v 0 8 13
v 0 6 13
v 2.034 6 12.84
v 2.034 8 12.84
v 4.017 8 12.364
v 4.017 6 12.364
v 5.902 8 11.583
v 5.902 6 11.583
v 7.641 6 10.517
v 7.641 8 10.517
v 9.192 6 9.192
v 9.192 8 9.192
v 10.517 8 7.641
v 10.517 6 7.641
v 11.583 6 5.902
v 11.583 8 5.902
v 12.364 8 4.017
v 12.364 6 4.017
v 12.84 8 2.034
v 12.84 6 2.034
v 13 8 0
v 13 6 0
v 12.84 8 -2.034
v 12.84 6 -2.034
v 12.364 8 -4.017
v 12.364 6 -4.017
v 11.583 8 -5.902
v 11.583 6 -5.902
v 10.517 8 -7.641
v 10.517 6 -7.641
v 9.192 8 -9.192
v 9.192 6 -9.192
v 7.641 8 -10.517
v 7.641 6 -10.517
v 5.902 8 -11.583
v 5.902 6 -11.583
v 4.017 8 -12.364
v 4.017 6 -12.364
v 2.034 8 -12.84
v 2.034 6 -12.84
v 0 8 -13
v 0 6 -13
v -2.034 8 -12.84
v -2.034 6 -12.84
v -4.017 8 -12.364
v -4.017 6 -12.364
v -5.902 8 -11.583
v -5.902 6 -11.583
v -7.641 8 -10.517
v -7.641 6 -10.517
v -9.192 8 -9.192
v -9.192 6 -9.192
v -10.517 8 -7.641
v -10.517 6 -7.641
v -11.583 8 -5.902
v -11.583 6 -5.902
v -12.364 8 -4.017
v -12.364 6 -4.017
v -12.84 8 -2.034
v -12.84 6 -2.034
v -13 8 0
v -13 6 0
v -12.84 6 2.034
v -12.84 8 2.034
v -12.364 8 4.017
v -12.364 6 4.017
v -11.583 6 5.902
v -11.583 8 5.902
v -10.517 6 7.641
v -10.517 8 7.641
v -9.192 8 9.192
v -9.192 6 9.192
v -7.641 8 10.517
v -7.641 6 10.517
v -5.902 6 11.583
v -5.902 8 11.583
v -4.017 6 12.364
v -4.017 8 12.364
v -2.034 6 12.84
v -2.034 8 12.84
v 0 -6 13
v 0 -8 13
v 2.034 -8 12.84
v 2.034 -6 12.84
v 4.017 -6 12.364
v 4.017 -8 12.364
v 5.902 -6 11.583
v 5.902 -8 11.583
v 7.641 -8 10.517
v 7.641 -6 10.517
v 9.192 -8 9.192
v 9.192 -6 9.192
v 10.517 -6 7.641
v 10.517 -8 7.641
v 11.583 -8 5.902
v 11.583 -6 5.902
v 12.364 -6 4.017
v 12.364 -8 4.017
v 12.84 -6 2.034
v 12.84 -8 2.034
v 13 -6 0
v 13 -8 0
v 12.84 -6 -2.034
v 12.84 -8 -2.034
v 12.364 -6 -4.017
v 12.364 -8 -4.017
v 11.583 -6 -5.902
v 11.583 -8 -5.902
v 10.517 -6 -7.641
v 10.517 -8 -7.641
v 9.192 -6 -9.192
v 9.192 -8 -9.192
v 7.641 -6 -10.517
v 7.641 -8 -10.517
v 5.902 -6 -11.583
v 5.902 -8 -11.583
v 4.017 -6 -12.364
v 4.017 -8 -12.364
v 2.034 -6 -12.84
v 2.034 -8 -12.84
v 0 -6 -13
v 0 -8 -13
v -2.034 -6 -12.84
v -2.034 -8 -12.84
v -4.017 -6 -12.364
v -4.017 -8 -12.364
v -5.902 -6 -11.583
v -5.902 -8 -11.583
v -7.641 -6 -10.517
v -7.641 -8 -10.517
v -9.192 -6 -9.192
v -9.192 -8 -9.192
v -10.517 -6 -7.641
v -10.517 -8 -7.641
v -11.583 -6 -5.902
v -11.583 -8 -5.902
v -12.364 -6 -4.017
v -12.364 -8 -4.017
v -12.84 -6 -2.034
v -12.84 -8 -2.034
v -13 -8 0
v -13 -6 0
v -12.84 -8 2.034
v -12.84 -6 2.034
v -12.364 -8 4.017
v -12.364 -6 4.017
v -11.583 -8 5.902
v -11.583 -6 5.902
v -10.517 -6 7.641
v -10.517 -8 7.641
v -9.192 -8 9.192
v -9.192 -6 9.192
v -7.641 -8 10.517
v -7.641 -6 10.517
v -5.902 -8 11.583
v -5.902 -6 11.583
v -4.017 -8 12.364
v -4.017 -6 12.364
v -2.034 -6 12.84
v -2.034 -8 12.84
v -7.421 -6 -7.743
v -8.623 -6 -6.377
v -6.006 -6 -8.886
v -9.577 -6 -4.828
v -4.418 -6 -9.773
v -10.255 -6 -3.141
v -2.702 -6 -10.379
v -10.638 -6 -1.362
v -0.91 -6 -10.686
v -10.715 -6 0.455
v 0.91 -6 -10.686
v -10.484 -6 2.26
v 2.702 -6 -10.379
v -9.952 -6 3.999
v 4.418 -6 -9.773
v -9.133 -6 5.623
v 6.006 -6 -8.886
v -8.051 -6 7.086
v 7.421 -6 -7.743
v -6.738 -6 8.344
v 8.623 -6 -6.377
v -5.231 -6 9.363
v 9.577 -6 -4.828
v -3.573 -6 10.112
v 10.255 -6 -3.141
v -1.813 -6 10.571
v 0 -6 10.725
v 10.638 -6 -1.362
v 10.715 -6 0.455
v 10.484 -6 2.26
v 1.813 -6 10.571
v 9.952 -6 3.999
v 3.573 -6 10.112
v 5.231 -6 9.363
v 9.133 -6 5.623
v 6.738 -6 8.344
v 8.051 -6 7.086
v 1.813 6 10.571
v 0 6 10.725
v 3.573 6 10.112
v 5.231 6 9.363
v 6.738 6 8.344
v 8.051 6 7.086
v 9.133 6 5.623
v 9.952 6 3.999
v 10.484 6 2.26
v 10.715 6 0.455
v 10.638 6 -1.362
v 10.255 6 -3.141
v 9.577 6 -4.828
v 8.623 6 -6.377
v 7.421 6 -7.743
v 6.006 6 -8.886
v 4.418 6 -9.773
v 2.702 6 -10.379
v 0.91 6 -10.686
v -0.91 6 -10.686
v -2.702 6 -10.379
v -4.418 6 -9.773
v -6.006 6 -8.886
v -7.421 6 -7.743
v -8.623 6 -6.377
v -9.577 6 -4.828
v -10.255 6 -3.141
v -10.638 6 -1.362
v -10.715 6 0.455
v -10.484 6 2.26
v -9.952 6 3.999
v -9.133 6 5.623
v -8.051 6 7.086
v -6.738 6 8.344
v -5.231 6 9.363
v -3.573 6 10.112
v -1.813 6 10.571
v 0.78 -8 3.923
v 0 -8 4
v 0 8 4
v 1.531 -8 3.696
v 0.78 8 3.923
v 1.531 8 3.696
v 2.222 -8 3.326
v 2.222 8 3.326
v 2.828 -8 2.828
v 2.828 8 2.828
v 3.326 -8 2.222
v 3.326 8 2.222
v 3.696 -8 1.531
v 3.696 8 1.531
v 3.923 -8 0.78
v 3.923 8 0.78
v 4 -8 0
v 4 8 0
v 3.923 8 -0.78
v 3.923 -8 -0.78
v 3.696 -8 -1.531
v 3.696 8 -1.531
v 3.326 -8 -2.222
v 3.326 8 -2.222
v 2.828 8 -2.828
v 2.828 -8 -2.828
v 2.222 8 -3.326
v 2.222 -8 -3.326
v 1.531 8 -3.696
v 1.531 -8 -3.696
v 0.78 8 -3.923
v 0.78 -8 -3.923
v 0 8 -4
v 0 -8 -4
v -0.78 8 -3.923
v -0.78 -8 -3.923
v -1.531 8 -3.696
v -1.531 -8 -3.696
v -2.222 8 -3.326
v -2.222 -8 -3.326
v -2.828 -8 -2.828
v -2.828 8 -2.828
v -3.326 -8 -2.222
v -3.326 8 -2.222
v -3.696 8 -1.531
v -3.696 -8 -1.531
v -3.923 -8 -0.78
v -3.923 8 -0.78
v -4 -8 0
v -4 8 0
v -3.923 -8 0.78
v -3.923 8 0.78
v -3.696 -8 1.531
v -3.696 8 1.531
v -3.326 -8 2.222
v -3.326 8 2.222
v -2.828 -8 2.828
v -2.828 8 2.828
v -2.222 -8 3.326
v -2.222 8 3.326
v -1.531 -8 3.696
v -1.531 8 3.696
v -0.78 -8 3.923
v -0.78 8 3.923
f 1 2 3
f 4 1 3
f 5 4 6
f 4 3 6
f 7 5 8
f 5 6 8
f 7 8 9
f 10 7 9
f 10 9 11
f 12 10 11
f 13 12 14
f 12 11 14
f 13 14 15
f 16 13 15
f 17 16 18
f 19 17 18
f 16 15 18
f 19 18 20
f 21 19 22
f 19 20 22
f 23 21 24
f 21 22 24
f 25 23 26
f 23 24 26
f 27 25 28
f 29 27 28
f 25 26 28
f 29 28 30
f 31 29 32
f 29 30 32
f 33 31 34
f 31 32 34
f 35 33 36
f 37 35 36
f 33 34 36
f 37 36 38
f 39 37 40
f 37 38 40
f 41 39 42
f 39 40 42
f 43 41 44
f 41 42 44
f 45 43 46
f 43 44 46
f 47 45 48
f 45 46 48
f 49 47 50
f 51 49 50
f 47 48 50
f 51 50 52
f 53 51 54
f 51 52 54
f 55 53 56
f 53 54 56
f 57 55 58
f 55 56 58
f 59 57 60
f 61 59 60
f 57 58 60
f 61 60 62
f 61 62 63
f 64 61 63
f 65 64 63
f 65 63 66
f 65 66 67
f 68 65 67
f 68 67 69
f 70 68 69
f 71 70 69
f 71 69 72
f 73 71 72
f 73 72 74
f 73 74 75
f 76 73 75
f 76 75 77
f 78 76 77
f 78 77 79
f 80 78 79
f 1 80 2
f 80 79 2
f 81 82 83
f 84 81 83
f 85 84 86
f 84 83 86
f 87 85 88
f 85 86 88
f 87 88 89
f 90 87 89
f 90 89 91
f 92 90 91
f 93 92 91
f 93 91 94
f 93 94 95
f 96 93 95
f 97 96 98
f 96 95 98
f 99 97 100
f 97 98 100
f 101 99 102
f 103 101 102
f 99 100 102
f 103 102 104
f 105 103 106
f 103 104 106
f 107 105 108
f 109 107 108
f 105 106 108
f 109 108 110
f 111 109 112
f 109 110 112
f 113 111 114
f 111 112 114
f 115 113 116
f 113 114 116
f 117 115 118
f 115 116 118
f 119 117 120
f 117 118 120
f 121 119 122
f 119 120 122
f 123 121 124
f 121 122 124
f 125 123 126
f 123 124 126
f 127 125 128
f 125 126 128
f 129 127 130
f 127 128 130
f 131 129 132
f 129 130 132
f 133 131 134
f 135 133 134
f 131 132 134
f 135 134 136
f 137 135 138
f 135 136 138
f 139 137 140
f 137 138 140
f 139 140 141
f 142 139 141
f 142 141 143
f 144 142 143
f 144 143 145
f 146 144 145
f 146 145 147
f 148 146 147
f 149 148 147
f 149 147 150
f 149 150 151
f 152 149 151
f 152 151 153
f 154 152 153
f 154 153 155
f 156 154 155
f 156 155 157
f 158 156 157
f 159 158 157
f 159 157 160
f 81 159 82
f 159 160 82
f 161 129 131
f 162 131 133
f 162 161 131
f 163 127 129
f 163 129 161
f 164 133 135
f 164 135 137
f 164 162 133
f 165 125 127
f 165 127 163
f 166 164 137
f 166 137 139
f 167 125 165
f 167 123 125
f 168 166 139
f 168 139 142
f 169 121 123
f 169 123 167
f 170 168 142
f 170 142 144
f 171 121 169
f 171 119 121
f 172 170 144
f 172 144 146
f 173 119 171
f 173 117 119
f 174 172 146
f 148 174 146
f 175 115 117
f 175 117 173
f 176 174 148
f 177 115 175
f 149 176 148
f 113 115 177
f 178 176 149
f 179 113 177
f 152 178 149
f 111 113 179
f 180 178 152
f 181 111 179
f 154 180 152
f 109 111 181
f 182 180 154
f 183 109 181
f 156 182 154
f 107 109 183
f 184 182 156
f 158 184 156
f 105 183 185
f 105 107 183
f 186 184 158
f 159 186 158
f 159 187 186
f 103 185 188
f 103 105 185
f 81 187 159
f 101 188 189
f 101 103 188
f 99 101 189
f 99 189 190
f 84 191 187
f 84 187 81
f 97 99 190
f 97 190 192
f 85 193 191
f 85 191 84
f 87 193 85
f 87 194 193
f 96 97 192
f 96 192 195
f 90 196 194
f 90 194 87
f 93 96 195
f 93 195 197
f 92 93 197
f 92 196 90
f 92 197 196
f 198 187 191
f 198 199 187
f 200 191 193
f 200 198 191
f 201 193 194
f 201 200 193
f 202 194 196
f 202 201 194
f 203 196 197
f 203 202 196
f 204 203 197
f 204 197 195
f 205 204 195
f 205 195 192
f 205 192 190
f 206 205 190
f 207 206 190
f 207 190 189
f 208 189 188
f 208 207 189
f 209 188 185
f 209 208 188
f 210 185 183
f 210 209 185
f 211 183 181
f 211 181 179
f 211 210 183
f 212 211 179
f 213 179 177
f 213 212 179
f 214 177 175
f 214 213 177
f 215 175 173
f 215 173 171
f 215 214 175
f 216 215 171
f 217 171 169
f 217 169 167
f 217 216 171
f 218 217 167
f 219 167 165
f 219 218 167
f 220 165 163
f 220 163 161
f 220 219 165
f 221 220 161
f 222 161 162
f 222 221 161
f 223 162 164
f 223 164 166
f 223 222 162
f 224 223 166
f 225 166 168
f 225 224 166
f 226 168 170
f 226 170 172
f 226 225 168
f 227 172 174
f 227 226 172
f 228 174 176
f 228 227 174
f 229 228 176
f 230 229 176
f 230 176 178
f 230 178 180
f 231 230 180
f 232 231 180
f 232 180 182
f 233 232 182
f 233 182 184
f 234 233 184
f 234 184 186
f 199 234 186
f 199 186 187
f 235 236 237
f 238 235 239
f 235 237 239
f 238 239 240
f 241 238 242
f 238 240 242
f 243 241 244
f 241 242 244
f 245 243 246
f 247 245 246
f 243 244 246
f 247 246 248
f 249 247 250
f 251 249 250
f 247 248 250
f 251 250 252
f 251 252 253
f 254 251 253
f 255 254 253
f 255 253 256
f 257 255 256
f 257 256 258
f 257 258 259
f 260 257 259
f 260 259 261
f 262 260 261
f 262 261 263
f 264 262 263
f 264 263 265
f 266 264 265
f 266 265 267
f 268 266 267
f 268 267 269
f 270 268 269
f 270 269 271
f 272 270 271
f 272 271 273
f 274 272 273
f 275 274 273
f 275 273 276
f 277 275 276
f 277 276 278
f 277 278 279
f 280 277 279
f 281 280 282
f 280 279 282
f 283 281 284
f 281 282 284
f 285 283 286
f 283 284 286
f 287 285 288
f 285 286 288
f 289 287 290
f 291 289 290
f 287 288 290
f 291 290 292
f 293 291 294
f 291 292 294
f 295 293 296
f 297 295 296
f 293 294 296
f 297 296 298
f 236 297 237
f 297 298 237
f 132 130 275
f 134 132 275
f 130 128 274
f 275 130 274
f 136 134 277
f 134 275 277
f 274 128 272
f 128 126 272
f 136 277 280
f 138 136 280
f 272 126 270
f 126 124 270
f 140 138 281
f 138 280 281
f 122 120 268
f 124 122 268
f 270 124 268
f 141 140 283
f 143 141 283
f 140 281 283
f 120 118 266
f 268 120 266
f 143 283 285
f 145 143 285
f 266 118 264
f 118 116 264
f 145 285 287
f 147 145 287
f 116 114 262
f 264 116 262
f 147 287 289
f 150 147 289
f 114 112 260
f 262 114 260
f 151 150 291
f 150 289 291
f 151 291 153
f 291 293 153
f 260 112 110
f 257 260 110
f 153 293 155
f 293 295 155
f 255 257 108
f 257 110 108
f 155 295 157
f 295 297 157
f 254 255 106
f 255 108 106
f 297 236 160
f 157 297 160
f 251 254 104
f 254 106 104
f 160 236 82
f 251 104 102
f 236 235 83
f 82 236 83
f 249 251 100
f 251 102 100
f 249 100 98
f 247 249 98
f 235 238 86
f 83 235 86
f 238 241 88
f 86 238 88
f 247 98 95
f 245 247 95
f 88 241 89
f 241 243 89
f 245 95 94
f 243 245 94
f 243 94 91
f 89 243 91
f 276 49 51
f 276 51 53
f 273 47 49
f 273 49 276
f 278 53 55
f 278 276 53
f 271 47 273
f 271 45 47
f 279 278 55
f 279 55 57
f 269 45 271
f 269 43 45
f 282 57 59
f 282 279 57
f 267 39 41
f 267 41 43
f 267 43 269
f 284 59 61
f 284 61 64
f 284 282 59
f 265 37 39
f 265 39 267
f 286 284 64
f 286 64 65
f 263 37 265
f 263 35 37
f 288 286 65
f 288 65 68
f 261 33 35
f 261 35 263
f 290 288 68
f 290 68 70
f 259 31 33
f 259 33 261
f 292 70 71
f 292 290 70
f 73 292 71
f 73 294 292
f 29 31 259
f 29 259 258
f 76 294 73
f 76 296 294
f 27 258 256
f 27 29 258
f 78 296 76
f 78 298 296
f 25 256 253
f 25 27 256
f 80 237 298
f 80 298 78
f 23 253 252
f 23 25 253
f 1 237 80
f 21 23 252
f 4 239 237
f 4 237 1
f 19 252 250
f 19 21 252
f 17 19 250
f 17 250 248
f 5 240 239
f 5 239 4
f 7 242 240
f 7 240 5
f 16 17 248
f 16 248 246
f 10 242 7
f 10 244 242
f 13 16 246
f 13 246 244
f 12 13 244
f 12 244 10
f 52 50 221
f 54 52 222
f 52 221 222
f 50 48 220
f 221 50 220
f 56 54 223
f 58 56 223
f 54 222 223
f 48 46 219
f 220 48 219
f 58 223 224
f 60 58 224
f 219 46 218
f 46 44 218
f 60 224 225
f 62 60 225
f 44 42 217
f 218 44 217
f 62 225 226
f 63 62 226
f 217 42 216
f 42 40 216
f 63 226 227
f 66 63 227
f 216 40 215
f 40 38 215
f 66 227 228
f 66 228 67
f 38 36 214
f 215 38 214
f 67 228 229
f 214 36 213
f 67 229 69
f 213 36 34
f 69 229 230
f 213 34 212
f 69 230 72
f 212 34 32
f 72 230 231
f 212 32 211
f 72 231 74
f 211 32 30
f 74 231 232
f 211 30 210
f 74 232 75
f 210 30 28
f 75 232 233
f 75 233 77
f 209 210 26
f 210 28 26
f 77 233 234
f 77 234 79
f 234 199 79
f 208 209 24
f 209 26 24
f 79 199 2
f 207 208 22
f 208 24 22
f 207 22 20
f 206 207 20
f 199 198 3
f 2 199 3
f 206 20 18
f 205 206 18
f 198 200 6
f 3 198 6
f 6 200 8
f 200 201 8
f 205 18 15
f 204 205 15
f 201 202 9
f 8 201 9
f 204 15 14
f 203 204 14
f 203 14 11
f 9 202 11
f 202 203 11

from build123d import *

# Parameters (mm, degrees)
SKETCH1_R           = 10.725
BOSS_EXTRUDE1_DEPTH = 6
BOSS_EXTRUDE2_START = 6
SKETCH2_R           = 13
BOSS_EXTRUDE2_DEPTH = 2
BOSS_EXTRUDE3_START = -8
SKETCH2_2_R         = 13
BOSS_EXTRUDE3_DEPTH = 2
CUT_EXTRUDE1_REACH  = 26.372
SKETCH3_R           = 4


with BuildPart() as part:
    # Sketch1 → Boss-Extrude1 (new, symmetric)
    with BuildSketch(Plane(origin=(0, 0, 0), x_dir=(1, 0, 0), z_dir=(0, 1, 0))):
        with Locations(Location((0, 0, 0), (0, 0, 270))):
            Circle(SKETCH1_R)
    extrude(amount=BOSS_EXTRUDE1_DEPTH, both=True)

    # Sketch2 → Boss-Extrude2 (add)
    with BuildSketch(Plane(origin=(0, 0, 0), x_dir=(1, 0, 0), z_dir=(0, 1, 0)).offset(BOSS_EXTRUDE2_START)):
        with Locations(Location((0, 0, 0), (0, 0, 270))):
            Circle(SKETCH2_R)
    extrude(amount=BOSS_EXTRUDE2_DEPTH)

    # Sketch2<2> → Boss-Extrude3 (add)
    with BuildSketch(Plane(origin=(0, 0, 0), x_dir=(1, 0, 0), z_dir=(0, 1, 0)).offset(BOSS_EXTRUDE3_START)):
        with Locations(Location((0, 0, 0), (0, 0, 270))):
            Circle(SKETCH2_2_R)
    extrude(amount=BOSS_EXTRUDE3_DEPTH)

    # Sketch3 → Cut-Extrude1 (cut, up to next)
    with BuildSketch(Plane(origin=(0, 8, 0), x_dir=(1, 0, 0), z_dir=(0, 1, 0)), mode=Mode.PRIVATE) as cut_extrude1_sk1:
        with Locations(Location((0, 0, 0), (0, 0, 270))):
            Circle(SKETCH3_R)
    cut_extrude1_tool1 = extrude(cut_extrude1_sk1.sketch, amount=-CUT_EXTRUDE1_REACH, mode=Mode.PRIVATE) & part.part
    add(cut_extrude1_tool1.solids().sort_by_distance((0, 8, 0))[0], mode=Mode.SUBTRACT)


solid = part.part
